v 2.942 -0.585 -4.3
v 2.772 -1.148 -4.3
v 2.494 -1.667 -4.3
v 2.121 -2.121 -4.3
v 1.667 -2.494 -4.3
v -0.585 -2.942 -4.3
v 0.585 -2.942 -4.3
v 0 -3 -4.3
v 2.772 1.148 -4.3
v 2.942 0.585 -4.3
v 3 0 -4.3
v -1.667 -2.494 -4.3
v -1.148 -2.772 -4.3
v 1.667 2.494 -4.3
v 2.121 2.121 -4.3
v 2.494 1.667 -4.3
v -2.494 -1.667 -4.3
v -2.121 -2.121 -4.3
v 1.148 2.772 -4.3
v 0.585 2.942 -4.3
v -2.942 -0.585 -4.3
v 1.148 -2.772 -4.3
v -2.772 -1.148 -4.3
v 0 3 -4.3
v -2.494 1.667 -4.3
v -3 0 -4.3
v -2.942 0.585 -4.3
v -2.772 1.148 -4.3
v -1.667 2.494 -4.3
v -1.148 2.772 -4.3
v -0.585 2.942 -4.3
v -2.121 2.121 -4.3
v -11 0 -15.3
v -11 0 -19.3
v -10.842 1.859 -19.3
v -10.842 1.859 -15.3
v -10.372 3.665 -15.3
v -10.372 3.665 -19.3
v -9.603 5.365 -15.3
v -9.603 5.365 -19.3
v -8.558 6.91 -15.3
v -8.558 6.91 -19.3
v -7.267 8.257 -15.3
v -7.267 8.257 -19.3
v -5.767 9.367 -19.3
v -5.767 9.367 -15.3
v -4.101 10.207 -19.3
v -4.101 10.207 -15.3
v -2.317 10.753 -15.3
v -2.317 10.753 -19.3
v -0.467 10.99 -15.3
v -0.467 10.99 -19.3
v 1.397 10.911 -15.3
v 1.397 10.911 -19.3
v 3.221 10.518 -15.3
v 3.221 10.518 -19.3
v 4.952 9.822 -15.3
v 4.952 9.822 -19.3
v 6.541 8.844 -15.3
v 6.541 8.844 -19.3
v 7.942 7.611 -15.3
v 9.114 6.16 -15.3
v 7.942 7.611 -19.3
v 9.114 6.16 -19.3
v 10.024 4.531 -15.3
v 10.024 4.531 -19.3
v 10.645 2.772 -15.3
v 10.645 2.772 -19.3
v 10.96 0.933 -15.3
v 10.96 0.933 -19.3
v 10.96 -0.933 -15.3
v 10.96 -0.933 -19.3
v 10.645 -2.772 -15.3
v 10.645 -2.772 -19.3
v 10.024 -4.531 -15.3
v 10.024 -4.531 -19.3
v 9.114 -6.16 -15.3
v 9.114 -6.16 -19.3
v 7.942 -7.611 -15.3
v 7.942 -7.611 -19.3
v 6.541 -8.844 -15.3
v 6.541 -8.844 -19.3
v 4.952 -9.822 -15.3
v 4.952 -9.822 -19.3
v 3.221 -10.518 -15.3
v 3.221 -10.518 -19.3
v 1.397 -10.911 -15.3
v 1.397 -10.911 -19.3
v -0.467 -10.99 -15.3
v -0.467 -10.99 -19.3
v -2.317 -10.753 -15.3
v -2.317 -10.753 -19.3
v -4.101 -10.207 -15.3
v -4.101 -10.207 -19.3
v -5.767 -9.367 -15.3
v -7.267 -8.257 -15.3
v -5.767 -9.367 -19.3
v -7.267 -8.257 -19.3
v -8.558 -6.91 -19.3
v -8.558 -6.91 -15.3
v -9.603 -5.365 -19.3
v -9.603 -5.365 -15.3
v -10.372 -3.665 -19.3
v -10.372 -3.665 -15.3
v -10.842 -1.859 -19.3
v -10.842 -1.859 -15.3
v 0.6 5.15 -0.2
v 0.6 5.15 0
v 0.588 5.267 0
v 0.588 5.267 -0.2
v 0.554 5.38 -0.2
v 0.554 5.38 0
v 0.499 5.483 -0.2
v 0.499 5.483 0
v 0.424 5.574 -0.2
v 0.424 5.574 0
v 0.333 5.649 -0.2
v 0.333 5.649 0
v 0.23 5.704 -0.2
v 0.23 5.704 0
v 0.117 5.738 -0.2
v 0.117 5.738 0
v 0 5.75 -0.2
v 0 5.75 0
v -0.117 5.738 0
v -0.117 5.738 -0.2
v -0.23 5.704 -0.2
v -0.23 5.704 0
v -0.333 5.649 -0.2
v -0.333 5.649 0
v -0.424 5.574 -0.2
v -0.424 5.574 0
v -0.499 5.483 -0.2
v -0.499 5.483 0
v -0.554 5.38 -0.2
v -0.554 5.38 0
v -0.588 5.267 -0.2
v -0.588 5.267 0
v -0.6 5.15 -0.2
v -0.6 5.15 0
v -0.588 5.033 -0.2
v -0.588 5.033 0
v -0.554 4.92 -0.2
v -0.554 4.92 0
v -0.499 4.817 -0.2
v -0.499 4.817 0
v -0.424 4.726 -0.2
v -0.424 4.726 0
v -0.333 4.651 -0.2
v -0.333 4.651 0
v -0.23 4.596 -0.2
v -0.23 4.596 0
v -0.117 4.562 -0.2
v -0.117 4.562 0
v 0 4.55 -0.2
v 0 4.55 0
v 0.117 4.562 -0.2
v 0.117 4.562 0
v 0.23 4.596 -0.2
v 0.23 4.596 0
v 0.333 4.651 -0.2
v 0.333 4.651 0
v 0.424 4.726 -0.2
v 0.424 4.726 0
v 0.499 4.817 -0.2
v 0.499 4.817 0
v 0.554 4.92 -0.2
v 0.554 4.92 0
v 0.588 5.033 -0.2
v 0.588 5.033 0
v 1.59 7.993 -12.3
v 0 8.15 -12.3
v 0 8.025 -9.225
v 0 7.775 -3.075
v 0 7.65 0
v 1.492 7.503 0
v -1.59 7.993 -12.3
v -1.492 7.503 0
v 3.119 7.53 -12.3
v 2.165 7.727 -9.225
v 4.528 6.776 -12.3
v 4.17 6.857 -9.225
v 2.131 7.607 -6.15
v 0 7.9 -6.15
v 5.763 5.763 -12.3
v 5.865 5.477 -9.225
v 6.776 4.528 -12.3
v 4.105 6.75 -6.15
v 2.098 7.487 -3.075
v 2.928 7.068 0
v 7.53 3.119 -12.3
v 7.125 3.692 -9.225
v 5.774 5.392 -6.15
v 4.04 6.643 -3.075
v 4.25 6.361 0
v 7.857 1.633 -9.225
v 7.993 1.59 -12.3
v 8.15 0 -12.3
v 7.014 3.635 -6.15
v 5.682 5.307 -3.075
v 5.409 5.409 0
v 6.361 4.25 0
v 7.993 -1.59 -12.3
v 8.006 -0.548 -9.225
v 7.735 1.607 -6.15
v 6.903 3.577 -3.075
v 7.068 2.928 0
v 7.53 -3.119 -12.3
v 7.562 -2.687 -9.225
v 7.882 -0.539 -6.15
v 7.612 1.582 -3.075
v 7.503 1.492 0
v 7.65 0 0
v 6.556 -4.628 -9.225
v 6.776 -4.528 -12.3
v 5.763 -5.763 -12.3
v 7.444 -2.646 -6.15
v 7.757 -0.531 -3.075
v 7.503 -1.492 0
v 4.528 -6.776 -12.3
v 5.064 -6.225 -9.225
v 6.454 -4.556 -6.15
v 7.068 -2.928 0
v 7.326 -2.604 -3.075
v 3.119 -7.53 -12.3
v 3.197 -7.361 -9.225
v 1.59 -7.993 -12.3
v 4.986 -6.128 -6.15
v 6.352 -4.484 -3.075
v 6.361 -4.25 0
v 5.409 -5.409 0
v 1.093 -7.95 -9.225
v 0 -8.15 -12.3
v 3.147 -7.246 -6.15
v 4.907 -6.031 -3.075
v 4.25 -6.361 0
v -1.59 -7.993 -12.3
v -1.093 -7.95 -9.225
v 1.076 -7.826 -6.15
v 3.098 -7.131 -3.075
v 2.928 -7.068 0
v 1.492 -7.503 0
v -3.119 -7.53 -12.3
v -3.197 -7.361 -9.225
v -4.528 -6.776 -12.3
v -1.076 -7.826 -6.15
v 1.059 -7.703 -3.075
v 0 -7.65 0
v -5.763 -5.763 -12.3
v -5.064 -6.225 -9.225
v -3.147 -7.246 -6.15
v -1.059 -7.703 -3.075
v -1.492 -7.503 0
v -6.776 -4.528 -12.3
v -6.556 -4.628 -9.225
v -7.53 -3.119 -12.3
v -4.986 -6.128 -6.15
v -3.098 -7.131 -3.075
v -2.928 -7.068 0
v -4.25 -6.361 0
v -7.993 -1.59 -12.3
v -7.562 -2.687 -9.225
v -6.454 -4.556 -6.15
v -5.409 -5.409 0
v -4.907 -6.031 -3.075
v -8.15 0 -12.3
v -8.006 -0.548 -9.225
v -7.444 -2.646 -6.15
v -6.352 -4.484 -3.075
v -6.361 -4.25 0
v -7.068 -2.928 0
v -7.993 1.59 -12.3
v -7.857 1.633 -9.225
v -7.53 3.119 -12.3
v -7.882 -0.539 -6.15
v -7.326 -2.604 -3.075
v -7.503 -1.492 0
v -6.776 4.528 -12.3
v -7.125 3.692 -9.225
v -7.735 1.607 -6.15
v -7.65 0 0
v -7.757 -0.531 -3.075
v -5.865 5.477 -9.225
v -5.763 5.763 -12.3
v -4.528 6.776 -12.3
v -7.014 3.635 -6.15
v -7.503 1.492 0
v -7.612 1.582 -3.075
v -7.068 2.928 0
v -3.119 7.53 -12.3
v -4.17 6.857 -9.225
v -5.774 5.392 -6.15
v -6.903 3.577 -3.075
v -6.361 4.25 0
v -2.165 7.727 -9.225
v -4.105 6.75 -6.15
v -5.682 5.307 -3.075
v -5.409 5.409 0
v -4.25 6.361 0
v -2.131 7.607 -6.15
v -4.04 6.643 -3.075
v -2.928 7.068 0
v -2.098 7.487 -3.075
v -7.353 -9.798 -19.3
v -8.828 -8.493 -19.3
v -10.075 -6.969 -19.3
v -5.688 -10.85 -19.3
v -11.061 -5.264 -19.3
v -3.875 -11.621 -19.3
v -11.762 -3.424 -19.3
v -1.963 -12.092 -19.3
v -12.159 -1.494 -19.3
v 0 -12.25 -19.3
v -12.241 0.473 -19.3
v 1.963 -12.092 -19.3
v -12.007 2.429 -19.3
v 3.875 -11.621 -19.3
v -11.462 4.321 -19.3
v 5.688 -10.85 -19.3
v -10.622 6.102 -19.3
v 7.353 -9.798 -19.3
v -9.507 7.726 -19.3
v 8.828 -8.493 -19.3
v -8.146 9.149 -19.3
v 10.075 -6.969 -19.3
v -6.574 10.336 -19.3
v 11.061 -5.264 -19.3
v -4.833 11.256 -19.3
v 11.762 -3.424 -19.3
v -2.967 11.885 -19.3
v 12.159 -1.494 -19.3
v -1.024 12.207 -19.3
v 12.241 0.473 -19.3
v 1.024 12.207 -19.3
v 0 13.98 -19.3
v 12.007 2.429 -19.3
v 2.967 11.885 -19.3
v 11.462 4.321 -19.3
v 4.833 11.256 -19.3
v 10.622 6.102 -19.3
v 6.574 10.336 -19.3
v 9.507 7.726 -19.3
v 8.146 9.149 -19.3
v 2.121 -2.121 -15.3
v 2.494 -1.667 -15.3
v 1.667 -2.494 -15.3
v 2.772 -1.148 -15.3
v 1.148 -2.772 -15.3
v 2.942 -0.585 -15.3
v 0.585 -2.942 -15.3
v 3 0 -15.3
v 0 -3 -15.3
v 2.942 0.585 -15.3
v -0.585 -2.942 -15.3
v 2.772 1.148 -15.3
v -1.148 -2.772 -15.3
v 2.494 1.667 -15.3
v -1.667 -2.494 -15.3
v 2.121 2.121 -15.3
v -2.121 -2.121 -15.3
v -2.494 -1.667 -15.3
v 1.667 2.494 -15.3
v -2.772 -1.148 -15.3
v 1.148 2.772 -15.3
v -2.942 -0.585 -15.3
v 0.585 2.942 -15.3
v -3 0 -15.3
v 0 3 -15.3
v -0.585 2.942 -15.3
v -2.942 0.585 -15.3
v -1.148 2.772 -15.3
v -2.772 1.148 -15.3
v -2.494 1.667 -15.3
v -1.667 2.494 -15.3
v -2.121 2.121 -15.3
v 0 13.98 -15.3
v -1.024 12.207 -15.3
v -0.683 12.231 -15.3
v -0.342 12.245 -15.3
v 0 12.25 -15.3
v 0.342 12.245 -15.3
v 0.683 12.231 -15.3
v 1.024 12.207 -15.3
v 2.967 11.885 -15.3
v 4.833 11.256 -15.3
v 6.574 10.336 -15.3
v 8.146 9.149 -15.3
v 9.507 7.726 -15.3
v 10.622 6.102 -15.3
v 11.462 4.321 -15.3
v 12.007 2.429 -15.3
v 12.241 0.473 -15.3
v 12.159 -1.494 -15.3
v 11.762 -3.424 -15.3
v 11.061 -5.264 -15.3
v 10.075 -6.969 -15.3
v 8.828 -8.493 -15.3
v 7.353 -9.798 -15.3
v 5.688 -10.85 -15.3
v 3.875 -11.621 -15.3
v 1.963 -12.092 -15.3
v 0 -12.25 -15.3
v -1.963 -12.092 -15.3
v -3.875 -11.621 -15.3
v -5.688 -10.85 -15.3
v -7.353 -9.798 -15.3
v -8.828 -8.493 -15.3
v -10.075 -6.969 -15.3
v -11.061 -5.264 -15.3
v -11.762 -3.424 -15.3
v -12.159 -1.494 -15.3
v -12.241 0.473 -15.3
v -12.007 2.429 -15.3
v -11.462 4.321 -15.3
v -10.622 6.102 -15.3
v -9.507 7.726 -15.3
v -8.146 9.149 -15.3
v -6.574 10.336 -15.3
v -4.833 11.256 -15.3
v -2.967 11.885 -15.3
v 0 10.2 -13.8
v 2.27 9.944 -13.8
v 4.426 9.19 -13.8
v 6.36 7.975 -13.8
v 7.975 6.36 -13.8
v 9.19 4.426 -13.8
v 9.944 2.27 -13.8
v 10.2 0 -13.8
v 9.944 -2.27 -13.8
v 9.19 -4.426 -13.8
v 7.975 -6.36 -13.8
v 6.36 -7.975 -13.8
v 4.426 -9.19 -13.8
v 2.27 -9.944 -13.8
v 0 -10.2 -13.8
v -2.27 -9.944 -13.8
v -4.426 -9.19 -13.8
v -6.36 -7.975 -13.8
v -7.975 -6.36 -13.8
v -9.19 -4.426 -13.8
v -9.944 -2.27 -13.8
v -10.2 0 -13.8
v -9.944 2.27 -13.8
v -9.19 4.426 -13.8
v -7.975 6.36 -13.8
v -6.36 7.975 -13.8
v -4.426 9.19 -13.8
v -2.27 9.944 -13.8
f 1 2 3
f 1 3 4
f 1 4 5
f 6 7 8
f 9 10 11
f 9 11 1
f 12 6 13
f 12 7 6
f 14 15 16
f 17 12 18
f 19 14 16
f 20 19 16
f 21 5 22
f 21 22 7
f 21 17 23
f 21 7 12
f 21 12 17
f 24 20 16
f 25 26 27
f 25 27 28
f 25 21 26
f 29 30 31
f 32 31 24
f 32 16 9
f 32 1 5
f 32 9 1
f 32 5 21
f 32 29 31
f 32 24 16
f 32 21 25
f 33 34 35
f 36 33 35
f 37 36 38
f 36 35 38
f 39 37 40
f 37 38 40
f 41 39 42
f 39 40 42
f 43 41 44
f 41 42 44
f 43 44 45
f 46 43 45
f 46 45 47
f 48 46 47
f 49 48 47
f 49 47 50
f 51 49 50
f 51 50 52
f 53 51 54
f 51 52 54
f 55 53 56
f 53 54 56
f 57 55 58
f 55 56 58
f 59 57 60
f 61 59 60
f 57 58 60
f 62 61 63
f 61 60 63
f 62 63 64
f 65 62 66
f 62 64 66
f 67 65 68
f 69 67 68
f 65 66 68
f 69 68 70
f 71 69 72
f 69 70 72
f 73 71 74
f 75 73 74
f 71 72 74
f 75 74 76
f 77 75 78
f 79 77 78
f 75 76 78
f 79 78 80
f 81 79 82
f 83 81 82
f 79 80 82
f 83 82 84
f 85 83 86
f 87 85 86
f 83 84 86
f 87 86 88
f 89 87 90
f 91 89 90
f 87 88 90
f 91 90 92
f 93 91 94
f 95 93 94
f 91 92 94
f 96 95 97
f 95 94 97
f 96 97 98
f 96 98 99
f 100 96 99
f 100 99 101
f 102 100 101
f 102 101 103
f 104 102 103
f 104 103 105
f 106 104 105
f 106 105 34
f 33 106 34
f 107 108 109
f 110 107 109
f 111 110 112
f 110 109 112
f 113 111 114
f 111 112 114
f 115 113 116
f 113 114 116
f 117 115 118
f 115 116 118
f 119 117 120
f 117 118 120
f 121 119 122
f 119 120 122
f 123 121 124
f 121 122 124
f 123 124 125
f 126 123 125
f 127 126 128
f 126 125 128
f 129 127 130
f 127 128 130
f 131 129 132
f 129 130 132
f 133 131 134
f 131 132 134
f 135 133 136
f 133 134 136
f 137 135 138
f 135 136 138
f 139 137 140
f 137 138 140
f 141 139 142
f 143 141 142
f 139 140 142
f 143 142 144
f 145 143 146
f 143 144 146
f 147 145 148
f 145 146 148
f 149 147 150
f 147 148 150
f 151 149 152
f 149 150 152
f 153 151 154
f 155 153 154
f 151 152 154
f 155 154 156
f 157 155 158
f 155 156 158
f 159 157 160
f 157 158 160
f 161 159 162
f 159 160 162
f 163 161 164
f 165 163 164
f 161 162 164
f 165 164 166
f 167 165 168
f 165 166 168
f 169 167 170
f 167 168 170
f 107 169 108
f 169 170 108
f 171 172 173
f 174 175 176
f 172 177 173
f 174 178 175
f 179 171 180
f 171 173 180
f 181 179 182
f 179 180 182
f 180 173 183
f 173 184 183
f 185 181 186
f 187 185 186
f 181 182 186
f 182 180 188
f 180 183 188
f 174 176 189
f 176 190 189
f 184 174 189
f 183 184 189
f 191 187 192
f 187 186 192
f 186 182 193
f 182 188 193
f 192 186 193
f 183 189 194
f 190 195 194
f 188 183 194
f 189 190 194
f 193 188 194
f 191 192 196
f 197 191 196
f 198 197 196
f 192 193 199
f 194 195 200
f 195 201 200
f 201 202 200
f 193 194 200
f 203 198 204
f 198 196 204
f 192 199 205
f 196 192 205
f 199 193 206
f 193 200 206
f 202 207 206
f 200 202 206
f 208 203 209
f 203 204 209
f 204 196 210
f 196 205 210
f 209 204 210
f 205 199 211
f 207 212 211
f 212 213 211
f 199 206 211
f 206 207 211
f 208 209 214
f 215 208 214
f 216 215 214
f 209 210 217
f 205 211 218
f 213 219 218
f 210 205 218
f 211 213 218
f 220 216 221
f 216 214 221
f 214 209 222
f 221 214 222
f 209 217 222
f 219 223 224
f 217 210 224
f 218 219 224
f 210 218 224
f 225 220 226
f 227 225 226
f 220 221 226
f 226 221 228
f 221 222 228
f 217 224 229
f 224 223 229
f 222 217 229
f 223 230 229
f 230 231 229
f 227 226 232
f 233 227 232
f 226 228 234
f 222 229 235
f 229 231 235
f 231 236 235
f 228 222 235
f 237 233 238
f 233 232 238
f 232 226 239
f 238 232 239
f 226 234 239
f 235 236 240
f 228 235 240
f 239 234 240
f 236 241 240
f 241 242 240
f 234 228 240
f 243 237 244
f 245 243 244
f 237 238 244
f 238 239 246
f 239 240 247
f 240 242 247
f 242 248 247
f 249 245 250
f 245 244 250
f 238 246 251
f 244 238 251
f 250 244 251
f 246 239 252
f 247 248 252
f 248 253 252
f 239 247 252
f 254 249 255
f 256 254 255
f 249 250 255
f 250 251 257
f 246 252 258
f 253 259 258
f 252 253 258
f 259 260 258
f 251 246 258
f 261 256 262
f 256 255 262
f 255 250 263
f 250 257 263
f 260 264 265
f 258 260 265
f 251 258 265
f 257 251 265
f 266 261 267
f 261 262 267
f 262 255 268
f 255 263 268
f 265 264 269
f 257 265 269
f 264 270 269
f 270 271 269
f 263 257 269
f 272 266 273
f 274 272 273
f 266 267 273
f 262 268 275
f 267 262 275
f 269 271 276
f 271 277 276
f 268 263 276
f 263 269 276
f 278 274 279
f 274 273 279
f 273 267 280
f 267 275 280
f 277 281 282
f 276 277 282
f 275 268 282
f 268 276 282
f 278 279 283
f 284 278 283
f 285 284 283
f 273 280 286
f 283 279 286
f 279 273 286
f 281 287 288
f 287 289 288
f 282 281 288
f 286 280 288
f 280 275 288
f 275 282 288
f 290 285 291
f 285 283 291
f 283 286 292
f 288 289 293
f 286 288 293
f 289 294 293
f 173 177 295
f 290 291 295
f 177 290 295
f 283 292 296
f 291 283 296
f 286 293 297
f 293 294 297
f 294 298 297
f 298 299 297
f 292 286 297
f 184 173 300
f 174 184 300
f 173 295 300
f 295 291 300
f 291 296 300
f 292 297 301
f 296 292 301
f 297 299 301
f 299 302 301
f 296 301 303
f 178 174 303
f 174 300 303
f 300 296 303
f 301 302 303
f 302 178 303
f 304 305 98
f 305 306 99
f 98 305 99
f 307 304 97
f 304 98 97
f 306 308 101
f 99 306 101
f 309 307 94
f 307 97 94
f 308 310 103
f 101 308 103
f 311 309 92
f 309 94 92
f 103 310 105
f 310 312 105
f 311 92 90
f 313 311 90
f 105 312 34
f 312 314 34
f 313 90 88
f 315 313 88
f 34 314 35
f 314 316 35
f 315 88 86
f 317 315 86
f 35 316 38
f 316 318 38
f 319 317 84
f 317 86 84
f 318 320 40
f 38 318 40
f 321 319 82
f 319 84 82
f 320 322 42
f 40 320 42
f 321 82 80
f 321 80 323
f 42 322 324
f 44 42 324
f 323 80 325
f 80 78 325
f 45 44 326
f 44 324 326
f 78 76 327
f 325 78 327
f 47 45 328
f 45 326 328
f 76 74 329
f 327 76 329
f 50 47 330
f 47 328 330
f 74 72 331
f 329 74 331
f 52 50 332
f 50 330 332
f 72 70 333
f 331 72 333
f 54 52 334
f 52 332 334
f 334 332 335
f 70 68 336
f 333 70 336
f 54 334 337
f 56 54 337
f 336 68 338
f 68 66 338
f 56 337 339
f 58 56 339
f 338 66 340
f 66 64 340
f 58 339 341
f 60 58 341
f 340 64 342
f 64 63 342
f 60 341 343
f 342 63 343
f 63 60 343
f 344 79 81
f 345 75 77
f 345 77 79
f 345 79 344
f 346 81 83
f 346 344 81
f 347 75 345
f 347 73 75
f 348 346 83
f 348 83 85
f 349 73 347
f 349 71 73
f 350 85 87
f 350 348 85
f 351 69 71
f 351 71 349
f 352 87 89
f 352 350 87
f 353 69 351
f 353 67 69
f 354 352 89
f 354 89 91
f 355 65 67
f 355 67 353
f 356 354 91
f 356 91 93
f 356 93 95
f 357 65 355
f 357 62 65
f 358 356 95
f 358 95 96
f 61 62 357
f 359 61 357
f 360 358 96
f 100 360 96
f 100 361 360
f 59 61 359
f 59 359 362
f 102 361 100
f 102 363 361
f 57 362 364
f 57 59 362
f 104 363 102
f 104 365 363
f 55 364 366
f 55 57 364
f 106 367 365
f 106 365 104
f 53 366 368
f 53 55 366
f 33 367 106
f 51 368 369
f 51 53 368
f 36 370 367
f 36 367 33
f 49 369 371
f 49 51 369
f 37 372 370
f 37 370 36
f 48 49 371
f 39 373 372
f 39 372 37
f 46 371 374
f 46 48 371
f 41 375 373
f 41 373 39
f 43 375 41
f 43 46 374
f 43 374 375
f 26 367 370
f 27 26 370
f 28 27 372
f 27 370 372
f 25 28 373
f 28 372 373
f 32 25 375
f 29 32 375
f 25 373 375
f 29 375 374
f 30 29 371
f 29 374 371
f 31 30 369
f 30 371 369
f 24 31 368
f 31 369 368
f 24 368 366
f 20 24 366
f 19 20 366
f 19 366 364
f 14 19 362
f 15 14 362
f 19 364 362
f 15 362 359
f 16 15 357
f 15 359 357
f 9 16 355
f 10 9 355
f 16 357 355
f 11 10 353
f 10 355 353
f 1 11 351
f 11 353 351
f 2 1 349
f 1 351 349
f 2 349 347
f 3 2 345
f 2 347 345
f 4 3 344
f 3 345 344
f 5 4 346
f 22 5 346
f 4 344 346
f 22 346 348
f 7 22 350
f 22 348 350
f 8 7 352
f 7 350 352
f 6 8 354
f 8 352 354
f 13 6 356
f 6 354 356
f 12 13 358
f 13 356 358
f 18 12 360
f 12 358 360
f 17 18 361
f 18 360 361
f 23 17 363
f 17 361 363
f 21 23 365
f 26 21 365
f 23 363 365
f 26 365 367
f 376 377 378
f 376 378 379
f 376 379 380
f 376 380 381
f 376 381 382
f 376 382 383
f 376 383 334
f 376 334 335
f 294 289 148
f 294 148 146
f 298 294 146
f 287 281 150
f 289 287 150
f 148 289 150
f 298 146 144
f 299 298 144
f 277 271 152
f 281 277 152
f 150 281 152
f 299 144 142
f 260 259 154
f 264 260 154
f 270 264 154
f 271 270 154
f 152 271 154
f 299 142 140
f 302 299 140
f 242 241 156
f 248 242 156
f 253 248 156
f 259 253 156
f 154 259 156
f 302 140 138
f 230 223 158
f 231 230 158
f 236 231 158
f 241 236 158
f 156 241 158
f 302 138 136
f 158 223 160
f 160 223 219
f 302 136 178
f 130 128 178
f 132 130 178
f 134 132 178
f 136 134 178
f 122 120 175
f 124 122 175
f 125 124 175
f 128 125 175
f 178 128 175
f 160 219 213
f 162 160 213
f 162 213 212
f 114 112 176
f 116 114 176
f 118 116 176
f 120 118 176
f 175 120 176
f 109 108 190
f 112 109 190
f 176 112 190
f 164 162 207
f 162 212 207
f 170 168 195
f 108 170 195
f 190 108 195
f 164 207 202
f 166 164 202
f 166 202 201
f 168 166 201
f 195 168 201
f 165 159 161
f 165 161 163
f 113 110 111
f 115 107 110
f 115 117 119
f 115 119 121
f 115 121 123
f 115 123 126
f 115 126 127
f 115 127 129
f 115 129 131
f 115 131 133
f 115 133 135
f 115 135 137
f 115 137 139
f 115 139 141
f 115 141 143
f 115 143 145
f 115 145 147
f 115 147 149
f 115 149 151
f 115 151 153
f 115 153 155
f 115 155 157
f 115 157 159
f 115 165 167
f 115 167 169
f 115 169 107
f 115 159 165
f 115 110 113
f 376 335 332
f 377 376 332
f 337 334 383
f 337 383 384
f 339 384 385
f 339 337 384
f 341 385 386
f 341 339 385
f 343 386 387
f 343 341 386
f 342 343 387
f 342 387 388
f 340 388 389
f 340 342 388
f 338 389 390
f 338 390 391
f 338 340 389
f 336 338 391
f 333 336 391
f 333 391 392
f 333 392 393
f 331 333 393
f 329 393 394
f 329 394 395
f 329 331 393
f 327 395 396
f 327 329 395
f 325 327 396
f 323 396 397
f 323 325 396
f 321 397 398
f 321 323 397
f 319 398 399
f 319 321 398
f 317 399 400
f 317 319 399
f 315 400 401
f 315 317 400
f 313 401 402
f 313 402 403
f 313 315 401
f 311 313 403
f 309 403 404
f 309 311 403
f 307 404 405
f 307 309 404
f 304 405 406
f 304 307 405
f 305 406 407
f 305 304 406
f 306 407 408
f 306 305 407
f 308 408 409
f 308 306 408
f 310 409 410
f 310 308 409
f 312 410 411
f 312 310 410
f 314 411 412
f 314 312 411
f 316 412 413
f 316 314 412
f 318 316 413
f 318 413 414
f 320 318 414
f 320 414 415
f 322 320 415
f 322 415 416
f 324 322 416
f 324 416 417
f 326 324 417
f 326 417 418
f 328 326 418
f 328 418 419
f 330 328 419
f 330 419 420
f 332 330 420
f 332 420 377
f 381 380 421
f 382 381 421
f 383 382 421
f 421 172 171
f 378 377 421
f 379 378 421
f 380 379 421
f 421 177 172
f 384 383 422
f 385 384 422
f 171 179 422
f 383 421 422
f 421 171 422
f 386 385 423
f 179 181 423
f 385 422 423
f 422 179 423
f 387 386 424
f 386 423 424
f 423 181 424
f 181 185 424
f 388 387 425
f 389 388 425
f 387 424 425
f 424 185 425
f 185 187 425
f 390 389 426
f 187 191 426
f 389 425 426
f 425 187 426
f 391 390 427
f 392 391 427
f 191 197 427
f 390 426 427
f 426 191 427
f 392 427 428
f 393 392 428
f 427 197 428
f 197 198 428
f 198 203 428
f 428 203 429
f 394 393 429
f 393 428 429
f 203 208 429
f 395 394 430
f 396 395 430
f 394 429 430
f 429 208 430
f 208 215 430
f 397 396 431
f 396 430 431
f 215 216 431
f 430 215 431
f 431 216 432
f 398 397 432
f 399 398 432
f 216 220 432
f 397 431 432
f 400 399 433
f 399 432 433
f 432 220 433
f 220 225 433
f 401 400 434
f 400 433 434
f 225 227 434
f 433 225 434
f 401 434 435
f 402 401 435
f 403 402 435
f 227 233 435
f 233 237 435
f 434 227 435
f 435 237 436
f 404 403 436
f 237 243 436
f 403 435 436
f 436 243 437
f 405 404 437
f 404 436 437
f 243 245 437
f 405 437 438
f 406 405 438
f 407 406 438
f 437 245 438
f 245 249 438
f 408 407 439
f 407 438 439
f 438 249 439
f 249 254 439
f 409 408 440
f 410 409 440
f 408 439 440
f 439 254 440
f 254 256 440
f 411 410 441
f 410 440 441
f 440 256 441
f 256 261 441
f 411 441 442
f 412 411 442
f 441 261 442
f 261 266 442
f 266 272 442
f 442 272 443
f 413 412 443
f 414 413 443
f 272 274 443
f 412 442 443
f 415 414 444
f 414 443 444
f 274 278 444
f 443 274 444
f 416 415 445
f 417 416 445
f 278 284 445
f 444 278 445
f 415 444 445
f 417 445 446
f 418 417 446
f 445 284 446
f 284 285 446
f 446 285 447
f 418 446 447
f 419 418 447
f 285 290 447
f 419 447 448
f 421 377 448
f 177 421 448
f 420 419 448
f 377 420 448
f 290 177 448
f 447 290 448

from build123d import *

# Parameters (mm, degrees)
SKETCH2_ONE_SIDE_W  = 4
SKETCH2_ONE_SIDE_H  = 12.25
BOSS_EXTRUDE1_DEPTH = 4
SKETCH4_R           = 0.6
CUT_EXTRUDE1_DEPTH  = 0.2
SKETCH5_R           = 11
CUT_EXTRUDE2_DEPTH  = 4
SKETCH6_R           = 3
CUT_EXTRUDE3_DEPTH  = 11


with BuildPart() as part:
    # Sketch2 one side → Revolve3 (revolve)
    with BuildSketch(Plane(origin=(0, 0, 0), x_dir=(0, 0, -1), z_dir=(1, 0, 0))):
        Polygon((12.3, 0), (12.3, 8.15), (0, 7.65), (0, 0), align=None)
        Polygon((15.3, 0), (15.3, 12.25), (12.3, 8.15), (12.3, 0), align=None)
        with Locations((17.3, 6.125)):
            Rectangle(SKETCH2_ONE_SIDE_W, SKETCH2_ONE_SIDE_H)
    revolve(axis=Axis((0, 0, 0), (0, 0, -1)))

    # Sketch3 → Boss-Extrude1 (add)
    with BuildSketch(Plane(origin=(0, 0, -19.3), x_dir=(-1, 0, 0), z_dir=(0, 0, -1))):
        Polygon((0, 13.98), (1.154700538, 11.98), (-1.154700538, 11.98), align=None)
    extrude(amount=-BOSS_EXTRUDE1_DEPTH)

    # Sketch4 → Cut-Extrude1 (cut)
    with BuildSketch(Plane.XY):
        with Locations((0, 5.15)):
            Circle(SKETCH4_R)
    extrude(amount=-CUT_EXTRUDE1_DEPTH, mode=Mode.SUBTRACT)

    # Sketch5 → Cut-Extrude2 (cut)
    with BuildSketch(Plane(origin=(0, 0, -19.3), x_dir=(-1, 0, 0), z_dir=(0, 0, -1))):
        Circle(SKETCH5_R)
    extrude(amount=-CUT_EXTRUDE2_DEPTH, mode=Mode.SUBTRACT)

    # Sketch6 → Cut-Extrude3 (cut)
    with BuildSketch(Plane(origin=(0, 0, -15.3), x_dir=(-1, 0, 0), z_dir=(0, 0, -1))):
        Circle(SKETCH6_R)
    extrude(amount=-CUT_EXTRUDE3_DEPTH, mode=Mode.SUBTRACT)


solid = part.part
